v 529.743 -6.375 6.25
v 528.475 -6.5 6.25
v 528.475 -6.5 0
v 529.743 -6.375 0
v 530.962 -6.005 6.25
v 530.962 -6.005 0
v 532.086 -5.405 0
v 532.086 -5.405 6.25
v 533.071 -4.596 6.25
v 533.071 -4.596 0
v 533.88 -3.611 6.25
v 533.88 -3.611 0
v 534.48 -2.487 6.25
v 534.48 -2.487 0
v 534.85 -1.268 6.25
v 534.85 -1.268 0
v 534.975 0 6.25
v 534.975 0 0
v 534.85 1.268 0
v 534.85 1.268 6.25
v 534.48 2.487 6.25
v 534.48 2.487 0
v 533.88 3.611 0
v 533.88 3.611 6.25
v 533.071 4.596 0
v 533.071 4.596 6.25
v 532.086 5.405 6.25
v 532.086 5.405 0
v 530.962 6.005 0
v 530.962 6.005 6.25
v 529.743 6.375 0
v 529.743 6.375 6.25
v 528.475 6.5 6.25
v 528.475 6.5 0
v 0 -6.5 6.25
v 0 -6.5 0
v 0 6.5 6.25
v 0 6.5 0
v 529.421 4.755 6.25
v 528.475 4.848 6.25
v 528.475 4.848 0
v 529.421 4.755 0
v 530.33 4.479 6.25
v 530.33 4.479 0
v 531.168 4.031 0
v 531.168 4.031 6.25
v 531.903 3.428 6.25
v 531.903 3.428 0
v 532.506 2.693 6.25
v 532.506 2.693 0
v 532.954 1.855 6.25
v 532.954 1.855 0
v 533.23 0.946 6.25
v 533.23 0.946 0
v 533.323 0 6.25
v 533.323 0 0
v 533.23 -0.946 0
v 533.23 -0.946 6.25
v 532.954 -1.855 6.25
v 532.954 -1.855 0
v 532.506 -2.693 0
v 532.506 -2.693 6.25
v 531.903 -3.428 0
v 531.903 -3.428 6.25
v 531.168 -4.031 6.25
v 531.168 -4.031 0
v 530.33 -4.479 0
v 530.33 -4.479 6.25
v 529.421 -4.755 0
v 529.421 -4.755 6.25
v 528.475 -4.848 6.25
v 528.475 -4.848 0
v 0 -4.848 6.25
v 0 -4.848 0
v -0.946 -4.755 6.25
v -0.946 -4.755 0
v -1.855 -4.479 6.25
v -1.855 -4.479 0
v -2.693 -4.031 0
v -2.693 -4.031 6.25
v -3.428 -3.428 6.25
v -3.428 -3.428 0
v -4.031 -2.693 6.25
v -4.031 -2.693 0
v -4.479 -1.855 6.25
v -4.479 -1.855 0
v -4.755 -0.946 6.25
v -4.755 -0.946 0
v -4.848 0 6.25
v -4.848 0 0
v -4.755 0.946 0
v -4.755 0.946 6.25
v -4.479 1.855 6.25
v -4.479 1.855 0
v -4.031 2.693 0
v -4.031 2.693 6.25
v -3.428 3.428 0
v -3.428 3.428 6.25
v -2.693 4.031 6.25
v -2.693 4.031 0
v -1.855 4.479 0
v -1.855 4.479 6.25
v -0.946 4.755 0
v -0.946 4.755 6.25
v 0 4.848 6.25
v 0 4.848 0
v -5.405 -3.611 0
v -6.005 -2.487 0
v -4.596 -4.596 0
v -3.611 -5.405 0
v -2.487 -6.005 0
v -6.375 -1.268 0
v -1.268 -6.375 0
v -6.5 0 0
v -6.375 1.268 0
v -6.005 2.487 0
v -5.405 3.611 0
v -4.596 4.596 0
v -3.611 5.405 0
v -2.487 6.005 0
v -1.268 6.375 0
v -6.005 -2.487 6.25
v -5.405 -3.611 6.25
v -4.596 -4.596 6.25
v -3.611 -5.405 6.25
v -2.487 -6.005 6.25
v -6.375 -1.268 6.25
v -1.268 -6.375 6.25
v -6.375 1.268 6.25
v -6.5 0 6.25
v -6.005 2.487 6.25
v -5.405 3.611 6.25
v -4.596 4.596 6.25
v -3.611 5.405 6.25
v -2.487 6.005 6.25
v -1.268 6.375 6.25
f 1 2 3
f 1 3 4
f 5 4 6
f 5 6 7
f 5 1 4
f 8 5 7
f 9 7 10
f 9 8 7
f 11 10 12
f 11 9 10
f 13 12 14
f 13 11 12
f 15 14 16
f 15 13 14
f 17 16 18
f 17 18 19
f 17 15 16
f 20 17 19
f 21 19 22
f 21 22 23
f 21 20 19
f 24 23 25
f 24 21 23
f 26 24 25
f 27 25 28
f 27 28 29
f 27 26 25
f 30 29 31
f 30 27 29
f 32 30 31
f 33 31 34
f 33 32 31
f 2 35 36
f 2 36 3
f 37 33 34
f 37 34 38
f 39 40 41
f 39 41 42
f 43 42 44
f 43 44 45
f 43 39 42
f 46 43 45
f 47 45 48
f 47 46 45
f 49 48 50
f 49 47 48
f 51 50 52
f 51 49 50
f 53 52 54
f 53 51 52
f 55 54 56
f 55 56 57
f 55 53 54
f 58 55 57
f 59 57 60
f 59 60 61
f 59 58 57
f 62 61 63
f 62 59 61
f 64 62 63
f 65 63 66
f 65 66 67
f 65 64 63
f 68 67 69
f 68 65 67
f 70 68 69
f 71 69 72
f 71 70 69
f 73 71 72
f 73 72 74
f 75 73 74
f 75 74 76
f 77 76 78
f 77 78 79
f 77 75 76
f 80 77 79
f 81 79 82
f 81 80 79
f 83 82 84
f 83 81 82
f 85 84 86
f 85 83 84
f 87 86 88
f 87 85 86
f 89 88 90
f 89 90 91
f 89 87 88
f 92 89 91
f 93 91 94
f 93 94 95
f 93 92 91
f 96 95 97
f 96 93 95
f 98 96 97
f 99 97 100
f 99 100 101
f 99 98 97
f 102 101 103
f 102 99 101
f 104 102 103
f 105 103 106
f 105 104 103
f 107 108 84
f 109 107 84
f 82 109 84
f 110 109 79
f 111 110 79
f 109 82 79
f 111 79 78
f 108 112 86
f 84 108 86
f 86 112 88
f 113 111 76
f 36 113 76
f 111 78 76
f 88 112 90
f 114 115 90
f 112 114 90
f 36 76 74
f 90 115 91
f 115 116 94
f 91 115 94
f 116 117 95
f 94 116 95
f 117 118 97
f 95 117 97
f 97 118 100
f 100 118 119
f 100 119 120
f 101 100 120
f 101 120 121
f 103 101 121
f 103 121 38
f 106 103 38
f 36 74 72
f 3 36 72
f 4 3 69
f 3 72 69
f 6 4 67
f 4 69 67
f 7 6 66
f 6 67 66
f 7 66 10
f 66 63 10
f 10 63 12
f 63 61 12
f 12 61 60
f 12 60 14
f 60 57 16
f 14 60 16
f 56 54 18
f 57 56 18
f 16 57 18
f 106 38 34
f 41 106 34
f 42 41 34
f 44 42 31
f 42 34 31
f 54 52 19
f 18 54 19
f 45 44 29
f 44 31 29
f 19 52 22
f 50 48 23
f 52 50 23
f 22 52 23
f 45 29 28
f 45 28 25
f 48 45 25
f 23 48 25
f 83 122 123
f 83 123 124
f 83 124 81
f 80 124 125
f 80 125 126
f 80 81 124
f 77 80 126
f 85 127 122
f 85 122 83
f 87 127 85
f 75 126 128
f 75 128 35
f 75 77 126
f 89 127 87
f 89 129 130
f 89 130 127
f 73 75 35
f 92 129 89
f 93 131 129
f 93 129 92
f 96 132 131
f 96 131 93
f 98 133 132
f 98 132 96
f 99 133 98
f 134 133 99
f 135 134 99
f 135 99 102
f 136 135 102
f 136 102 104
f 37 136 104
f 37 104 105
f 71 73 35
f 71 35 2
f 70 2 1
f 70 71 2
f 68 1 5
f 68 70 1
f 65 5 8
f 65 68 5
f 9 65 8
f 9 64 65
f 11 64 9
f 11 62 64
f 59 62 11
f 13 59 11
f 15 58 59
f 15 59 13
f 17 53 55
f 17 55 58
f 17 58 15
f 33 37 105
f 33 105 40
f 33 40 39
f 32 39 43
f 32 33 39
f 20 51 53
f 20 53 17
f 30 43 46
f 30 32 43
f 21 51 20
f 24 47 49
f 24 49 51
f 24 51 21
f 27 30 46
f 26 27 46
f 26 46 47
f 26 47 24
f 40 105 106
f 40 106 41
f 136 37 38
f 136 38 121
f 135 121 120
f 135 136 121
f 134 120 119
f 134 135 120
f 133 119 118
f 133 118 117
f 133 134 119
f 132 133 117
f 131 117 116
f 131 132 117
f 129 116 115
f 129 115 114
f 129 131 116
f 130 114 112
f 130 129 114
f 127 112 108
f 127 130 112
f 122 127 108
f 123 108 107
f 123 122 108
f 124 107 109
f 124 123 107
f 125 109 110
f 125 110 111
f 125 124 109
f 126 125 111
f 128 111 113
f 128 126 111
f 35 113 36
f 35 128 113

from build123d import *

# Parameters (mm, degrees)
RESSALTO_EXTRUS_O1_DEPTH = 6.25


with BuildPart() as part:
    # Esboço1 → Ressalto-extrusão1 (new body)
    with BuildSketch(Plane.XY.offset(6.25)):
        with BuildLine():
            Line((528.475, 6.5), (0, 6.5))
            ThreePointArc((0, 6.5), (-6.5, 0), (0, -6.5))
            Line((0, -6.5), (528.475, -6.5))
            ThreePointArc((528.475, -6.5), (534.975, 0), (528.475, 6.5))
        make_face()
        with BuildLine():
            Line((0, 4.848), (528.475, 4.848))
            ThreePointArc((528.475, 4.848), (533.323, 0), (528.475, -4.848))
            Line((528.475, -4.848), (0, -4.848))
            ThreePointArc((0, -4.848), (-4.848, 0), (0, 4.848))
        make_face(mode=Mode.SUBTRACT)
    extrude(amount=-RESSALTO_EXTRUS_O1_DEPTH)


solid = part.part
